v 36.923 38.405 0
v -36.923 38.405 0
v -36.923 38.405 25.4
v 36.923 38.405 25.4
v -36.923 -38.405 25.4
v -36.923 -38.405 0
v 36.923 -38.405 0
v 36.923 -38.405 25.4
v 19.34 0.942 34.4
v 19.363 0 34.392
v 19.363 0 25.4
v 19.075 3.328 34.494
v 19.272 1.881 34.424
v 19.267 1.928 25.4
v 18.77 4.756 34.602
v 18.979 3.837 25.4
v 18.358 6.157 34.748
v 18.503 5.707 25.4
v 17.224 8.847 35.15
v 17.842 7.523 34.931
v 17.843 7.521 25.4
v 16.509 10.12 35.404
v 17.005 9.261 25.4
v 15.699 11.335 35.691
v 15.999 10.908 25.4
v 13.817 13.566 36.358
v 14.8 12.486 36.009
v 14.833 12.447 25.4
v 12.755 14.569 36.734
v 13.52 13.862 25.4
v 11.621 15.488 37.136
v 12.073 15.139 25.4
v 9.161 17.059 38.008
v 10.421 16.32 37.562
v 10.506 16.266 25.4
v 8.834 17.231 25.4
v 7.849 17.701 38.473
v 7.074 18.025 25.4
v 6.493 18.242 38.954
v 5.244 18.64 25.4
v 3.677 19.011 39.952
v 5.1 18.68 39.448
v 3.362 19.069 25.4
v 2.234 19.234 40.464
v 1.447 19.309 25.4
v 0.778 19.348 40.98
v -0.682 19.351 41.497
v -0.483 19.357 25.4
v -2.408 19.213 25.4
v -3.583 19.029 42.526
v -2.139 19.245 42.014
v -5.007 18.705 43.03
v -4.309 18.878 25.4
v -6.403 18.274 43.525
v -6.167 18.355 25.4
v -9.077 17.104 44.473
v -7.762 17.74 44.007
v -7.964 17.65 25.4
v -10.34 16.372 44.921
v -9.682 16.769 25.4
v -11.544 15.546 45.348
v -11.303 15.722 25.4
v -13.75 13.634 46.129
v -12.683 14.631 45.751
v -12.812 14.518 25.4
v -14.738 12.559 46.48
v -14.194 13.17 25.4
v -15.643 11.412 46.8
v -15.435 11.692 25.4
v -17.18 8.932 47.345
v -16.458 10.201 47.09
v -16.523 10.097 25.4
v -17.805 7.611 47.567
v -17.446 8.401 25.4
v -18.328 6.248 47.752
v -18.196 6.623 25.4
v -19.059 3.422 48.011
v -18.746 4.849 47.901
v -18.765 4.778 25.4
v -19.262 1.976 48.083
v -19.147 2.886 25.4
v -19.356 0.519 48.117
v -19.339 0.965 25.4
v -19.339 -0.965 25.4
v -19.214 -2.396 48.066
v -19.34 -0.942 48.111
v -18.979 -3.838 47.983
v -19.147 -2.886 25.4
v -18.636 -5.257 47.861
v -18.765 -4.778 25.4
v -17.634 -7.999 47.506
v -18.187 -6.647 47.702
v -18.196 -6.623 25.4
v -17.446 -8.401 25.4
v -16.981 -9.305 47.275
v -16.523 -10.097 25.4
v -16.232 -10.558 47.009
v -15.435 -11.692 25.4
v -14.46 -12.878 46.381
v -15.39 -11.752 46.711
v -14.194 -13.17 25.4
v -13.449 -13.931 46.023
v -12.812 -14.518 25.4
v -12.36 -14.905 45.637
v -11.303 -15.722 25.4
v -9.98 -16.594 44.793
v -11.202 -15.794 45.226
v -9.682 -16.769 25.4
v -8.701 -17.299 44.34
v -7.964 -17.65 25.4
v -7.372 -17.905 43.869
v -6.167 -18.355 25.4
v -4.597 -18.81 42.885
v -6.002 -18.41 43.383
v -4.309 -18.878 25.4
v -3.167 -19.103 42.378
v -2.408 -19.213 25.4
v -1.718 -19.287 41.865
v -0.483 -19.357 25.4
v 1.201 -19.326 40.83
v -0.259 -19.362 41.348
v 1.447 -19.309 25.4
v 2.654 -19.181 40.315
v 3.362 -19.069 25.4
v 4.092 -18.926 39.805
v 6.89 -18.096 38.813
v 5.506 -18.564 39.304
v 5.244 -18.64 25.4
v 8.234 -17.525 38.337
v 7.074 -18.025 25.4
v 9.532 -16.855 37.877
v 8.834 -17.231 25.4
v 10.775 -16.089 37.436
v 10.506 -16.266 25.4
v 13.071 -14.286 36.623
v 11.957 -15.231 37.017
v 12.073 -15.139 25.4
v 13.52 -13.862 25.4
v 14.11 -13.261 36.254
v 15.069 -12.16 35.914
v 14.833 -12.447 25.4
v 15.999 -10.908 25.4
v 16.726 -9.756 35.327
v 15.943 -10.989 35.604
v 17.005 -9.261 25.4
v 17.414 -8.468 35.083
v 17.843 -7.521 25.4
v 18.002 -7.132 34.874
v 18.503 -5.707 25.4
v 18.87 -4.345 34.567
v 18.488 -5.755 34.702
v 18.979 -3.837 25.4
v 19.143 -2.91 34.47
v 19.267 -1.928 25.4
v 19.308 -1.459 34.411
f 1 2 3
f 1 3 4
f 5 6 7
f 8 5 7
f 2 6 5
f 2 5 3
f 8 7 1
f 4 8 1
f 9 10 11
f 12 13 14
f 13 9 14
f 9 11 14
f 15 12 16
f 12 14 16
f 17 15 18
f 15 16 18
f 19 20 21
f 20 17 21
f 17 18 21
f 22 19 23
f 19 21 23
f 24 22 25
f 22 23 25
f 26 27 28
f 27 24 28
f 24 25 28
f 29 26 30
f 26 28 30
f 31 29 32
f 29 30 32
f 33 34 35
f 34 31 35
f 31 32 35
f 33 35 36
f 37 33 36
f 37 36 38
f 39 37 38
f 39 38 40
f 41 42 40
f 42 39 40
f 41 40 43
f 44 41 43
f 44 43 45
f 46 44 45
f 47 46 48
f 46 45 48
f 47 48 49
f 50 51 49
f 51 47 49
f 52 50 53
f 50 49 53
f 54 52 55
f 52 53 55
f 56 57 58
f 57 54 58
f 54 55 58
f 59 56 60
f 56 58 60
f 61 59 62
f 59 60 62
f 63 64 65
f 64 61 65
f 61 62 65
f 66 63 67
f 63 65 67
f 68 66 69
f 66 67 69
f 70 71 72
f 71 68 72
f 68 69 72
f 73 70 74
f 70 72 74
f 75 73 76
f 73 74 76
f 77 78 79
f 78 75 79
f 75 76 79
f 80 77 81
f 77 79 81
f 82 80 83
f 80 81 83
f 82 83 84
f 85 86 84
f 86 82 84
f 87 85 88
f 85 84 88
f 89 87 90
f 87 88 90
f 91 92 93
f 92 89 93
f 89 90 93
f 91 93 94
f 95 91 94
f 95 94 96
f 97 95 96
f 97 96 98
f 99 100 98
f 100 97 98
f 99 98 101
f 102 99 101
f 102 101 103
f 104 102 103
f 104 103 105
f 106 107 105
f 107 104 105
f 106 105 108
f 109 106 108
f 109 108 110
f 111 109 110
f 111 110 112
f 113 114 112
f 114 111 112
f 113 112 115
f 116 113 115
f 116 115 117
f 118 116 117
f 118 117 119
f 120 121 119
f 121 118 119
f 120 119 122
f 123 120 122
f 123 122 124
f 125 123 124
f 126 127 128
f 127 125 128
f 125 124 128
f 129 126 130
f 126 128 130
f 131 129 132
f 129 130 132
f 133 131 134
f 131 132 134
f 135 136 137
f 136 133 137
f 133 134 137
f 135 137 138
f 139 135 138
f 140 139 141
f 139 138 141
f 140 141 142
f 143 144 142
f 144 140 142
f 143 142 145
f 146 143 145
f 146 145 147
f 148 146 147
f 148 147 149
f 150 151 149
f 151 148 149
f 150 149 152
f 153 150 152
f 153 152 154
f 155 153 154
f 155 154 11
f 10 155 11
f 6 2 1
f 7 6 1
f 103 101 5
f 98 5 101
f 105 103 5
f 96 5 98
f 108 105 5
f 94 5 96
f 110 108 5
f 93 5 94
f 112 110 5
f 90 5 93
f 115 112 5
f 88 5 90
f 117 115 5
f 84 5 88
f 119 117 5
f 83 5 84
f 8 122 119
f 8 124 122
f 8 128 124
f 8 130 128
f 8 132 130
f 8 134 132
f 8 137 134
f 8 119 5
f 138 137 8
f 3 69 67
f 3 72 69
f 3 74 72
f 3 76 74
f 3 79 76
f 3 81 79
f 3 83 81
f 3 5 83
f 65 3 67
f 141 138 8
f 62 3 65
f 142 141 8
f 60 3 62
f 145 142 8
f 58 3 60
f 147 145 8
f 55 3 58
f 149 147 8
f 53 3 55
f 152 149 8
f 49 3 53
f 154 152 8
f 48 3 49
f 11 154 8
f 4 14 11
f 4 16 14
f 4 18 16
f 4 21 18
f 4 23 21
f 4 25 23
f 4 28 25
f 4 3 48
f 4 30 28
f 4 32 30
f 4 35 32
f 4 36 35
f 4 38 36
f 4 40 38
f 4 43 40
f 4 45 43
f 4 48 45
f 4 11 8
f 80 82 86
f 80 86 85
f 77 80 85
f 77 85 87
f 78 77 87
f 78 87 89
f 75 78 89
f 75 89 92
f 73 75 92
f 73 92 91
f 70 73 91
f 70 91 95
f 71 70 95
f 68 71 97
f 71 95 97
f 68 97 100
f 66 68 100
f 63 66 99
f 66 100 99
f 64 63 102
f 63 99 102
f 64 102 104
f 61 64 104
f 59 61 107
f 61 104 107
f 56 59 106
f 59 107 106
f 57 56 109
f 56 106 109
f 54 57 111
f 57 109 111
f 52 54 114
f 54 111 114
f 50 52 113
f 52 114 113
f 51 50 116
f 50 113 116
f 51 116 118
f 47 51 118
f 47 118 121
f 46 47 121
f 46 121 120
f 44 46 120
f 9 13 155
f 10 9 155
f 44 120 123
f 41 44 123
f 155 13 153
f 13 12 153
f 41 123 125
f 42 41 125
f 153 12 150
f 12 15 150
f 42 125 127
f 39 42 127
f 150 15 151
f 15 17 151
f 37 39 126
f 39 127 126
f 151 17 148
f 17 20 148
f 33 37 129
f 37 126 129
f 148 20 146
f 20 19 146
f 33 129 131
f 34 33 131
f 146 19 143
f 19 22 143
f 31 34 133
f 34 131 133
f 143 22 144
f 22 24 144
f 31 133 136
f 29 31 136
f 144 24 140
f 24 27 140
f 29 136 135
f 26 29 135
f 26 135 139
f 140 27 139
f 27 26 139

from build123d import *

# Parameters (mm, degrees)
F0_W     = 73.845298
F0_H     = 76.810576
F1_DEPTH = 25.4
F2_R     = 19.363369
F3_DEPTH = 25.4
F5_DEPTH = 25.4


with BuildPart() as f1:
    # F0 (on Top) → F1 (new body)
    with BuildSketch(Plane.XY):
        Rectangle(F0_W, F0_H)
    extrude(amount=F1_DEPTH)

    # F2 (on face) → F3 (join)
    with BuildSketch(Plane.XY.offset(25.4)):
        Circle(F2_R)
    extrude(amount=F3_DEPTH)

    # F4 (on Front) → F5 (cut, symmetric)
    with BuildSketch(Plane.XZ):
        Polygon((20.831788, 68.200894), (-42.327017, 56.259107), (49.757458, 23.61821), align=None)
    extrude(amount=F5_DEPTH, both=True, mode=Mode.SUBTRACT)


solid = f1.part
